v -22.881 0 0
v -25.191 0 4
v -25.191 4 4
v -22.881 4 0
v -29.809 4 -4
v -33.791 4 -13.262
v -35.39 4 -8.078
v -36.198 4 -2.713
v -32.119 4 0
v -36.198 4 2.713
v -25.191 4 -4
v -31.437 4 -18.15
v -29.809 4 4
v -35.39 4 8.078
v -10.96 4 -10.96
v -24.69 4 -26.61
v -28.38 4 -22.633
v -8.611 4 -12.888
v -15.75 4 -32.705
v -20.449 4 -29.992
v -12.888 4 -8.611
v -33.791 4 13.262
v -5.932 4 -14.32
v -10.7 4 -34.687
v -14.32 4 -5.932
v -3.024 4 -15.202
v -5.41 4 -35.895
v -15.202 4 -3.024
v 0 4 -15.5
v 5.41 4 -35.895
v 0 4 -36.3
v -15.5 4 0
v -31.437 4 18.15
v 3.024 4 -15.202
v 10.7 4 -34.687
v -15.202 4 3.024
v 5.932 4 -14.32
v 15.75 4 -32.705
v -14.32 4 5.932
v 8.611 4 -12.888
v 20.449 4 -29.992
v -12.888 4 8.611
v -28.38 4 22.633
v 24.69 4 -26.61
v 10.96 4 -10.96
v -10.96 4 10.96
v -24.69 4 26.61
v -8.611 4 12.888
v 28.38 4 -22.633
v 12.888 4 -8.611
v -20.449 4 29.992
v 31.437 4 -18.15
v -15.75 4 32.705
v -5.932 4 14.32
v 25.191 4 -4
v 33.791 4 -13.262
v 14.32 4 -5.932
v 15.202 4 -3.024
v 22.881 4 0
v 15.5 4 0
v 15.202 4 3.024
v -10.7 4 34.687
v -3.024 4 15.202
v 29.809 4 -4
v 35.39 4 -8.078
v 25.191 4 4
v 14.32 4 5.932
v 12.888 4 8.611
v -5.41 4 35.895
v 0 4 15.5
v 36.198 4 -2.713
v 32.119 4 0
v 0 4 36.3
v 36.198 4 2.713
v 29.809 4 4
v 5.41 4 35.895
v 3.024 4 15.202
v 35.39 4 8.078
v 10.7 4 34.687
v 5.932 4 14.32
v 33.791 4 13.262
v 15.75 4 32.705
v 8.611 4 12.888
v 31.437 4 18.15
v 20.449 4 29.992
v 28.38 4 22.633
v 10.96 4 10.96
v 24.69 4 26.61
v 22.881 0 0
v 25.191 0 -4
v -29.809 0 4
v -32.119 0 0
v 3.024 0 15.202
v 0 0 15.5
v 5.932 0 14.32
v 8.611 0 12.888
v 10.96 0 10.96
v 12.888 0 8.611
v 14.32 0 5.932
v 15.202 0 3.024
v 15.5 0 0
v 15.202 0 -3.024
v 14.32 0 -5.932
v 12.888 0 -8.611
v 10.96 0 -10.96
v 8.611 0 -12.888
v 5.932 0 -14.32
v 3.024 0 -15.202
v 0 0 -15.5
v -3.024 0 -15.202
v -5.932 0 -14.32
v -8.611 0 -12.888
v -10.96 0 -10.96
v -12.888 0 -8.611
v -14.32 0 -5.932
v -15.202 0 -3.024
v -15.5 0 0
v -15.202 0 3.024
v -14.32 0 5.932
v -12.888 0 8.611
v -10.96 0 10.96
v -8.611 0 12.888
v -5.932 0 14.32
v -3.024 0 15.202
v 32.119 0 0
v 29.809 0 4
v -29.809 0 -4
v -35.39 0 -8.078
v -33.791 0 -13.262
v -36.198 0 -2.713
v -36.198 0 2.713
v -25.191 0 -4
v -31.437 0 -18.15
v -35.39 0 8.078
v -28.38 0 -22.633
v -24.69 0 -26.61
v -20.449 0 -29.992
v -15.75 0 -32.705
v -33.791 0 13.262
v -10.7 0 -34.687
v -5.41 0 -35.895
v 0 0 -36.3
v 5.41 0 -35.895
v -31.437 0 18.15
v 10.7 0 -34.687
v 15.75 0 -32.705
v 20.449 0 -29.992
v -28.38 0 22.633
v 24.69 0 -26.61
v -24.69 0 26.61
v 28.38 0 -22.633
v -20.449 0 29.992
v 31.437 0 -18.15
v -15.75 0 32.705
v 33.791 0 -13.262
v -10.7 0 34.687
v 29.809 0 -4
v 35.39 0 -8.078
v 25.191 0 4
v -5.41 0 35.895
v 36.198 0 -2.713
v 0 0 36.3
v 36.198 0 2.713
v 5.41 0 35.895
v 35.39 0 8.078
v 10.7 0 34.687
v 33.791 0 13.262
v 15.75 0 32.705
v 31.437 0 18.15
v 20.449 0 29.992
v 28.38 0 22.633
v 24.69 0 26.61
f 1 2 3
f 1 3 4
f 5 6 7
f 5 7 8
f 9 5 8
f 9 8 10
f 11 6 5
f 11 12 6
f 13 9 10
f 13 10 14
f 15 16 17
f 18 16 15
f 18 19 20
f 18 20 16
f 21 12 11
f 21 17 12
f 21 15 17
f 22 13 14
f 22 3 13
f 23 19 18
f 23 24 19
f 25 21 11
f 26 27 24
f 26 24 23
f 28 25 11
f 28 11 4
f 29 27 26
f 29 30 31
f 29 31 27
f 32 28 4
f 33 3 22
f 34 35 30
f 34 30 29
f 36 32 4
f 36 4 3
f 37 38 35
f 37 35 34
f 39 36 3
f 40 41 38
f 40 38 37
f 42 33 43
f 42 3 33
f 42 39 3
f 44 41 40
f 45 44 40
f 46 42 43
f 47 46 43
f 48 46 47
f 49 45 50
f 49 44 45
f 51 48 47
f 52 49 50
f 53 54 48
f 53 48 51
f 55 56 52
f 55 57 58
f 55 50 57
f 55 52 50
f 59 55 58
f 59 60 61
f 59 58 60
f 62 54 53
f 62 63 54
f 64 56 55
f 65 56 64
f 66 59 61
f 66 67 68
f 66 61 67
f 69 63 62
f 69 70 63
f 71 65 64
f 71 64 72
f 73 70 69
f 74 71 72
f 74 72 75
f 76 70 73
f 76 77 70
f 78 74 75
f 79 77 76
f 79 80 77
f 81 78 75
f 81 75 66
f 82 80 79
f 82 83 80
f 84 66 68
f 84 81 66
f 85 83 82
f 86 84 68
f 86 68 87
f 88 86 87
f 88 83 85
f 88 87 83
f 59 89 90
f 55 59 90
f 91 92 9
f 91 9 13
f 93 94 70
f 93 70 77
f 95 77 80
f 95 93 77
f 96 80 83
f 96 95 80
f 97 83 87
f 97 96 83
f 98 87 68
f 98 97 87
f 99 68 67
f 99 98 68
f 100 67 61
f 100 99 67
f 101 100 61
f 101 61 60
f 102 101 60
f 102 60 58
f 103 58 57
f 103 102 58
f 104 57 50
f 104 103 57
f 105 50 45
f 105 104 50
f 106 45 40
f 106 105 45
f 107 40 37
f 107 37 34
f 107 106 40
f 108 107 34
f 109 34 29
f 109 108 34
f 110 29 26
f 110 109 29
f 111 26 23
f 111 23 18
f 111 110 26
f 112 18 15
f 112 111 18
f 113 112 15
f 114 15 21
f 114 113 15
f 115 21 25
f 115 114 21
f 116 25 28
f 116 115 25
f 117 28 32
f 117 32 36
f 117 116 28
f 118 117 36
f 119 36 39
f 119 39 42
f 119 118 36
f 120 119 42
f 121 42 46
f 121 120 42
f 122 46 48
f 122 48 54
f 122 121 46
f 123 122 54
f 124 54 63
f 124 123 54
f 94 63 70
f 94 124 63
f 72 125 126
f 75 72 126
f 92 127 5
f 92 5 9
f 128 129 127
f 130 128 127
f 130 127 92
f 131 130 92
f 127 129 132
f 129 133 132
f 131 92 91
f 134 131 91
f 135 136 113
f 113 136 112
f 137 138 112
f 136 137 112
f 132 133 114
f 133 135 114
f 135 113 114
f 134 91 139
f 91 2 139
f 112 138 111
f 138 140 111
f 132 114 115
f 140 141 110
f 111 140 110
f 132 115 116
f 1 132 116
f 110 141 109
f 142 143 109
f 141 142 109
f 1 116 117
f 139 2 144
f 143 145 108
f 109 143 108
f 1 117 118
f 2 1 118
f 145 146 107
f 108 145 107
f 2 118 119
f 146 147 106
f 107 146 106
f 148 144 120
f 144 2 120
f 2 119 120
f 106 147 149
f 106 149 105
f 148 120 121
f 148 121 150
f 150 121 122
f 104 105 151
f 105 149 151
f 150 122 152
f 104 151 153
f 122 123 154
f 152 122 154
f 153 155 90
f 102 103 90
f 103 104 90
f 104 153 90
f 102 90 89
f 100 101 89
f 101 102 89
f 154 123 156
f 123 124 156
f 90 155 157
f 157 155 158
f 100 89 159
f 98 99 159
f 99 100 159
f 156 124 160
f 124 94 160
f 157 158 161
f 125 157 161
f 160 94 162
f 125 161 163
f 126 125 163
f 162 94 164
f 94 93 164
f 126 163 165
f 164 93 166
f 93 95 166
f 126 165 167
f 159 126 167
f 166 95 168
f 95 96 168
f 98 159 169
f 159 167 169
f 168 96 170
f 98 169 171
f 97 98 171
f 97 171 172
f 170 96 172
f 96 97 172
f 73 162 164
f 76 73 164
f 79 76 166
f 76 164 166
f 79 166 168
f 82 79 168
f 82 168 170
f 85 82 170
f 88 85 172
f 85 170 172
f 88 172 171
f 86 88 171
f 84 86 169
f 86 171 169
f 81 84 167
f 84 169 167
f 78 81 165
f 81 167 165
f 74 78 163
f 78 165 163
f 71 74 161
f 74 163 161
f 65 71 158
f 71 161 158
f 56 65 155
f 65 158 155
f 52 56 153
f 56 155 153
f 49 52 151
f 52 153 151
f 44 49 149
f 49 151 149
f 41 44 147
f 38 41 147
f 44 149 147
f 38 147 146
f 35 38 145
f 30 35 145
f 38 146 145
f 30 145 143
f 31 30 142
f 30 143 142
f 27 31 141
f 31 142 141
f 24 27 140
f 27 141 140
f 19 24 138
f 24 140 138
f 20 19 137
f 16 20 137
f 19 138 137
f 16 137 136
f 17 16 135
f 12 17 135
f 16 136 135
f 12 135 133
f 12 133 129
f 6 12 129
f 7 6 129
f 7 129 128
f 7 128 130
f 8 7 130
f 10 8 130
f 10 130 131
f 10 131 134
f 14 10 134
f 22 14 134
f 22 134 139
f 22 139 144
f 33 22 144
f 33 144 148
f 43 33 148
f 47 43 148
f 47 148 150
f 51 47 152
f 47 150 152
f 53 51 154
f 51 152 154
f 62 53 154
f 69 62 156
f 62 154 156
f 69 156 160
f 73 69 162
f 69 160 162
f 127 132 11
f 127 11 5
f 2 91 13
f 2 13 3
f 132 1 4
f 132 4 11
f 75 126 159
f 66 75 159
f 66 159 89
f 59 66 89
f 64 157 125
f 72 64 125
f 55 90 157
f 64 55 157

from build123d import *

# Parameters (mm, degrees)
SKETCH1_R           = 36.3
SKETCH1_R_2         = 15.5
BOSS_EXTRUDE1_DEPTH = 4


with BuildPart() as part:
    # Sketch1 → Boss-Extrude1 (new body)
    with BuildSketch(Plane(origin=(0, 0, 0), x_dir=(1, 0, 0), z_dir=(0, 1, 0))):
        with Locations(Location((0, 0, 0), (0, 0, 270))):
            Circle(SKETCH1_R)
        with Locations(Location((0, 0, 0), (0, 0, 270))):
            Circle(SKETCH1_R_2, mode=Mode.SUBTRACT)
        Polygon((25.190598923, -4), (22.881197846, 0), (25.190598923, 4), (29.809401077, 4), (32.118802154, 0), (29.809401077, -4), align=None, mode=Mode.SUBTRACT)
        Polygon((-22.881197846, 0), (-25.190598923, 4), (-29.809401077, 4), (-32.118802154, 0), (-29.809401077, -4), (-25.190598923, -4), align=None, mode=Mode.SUBTRACT)
    extrude(amount=BOSS_EXTRUDE1_DEPTH)


solid = part.part
